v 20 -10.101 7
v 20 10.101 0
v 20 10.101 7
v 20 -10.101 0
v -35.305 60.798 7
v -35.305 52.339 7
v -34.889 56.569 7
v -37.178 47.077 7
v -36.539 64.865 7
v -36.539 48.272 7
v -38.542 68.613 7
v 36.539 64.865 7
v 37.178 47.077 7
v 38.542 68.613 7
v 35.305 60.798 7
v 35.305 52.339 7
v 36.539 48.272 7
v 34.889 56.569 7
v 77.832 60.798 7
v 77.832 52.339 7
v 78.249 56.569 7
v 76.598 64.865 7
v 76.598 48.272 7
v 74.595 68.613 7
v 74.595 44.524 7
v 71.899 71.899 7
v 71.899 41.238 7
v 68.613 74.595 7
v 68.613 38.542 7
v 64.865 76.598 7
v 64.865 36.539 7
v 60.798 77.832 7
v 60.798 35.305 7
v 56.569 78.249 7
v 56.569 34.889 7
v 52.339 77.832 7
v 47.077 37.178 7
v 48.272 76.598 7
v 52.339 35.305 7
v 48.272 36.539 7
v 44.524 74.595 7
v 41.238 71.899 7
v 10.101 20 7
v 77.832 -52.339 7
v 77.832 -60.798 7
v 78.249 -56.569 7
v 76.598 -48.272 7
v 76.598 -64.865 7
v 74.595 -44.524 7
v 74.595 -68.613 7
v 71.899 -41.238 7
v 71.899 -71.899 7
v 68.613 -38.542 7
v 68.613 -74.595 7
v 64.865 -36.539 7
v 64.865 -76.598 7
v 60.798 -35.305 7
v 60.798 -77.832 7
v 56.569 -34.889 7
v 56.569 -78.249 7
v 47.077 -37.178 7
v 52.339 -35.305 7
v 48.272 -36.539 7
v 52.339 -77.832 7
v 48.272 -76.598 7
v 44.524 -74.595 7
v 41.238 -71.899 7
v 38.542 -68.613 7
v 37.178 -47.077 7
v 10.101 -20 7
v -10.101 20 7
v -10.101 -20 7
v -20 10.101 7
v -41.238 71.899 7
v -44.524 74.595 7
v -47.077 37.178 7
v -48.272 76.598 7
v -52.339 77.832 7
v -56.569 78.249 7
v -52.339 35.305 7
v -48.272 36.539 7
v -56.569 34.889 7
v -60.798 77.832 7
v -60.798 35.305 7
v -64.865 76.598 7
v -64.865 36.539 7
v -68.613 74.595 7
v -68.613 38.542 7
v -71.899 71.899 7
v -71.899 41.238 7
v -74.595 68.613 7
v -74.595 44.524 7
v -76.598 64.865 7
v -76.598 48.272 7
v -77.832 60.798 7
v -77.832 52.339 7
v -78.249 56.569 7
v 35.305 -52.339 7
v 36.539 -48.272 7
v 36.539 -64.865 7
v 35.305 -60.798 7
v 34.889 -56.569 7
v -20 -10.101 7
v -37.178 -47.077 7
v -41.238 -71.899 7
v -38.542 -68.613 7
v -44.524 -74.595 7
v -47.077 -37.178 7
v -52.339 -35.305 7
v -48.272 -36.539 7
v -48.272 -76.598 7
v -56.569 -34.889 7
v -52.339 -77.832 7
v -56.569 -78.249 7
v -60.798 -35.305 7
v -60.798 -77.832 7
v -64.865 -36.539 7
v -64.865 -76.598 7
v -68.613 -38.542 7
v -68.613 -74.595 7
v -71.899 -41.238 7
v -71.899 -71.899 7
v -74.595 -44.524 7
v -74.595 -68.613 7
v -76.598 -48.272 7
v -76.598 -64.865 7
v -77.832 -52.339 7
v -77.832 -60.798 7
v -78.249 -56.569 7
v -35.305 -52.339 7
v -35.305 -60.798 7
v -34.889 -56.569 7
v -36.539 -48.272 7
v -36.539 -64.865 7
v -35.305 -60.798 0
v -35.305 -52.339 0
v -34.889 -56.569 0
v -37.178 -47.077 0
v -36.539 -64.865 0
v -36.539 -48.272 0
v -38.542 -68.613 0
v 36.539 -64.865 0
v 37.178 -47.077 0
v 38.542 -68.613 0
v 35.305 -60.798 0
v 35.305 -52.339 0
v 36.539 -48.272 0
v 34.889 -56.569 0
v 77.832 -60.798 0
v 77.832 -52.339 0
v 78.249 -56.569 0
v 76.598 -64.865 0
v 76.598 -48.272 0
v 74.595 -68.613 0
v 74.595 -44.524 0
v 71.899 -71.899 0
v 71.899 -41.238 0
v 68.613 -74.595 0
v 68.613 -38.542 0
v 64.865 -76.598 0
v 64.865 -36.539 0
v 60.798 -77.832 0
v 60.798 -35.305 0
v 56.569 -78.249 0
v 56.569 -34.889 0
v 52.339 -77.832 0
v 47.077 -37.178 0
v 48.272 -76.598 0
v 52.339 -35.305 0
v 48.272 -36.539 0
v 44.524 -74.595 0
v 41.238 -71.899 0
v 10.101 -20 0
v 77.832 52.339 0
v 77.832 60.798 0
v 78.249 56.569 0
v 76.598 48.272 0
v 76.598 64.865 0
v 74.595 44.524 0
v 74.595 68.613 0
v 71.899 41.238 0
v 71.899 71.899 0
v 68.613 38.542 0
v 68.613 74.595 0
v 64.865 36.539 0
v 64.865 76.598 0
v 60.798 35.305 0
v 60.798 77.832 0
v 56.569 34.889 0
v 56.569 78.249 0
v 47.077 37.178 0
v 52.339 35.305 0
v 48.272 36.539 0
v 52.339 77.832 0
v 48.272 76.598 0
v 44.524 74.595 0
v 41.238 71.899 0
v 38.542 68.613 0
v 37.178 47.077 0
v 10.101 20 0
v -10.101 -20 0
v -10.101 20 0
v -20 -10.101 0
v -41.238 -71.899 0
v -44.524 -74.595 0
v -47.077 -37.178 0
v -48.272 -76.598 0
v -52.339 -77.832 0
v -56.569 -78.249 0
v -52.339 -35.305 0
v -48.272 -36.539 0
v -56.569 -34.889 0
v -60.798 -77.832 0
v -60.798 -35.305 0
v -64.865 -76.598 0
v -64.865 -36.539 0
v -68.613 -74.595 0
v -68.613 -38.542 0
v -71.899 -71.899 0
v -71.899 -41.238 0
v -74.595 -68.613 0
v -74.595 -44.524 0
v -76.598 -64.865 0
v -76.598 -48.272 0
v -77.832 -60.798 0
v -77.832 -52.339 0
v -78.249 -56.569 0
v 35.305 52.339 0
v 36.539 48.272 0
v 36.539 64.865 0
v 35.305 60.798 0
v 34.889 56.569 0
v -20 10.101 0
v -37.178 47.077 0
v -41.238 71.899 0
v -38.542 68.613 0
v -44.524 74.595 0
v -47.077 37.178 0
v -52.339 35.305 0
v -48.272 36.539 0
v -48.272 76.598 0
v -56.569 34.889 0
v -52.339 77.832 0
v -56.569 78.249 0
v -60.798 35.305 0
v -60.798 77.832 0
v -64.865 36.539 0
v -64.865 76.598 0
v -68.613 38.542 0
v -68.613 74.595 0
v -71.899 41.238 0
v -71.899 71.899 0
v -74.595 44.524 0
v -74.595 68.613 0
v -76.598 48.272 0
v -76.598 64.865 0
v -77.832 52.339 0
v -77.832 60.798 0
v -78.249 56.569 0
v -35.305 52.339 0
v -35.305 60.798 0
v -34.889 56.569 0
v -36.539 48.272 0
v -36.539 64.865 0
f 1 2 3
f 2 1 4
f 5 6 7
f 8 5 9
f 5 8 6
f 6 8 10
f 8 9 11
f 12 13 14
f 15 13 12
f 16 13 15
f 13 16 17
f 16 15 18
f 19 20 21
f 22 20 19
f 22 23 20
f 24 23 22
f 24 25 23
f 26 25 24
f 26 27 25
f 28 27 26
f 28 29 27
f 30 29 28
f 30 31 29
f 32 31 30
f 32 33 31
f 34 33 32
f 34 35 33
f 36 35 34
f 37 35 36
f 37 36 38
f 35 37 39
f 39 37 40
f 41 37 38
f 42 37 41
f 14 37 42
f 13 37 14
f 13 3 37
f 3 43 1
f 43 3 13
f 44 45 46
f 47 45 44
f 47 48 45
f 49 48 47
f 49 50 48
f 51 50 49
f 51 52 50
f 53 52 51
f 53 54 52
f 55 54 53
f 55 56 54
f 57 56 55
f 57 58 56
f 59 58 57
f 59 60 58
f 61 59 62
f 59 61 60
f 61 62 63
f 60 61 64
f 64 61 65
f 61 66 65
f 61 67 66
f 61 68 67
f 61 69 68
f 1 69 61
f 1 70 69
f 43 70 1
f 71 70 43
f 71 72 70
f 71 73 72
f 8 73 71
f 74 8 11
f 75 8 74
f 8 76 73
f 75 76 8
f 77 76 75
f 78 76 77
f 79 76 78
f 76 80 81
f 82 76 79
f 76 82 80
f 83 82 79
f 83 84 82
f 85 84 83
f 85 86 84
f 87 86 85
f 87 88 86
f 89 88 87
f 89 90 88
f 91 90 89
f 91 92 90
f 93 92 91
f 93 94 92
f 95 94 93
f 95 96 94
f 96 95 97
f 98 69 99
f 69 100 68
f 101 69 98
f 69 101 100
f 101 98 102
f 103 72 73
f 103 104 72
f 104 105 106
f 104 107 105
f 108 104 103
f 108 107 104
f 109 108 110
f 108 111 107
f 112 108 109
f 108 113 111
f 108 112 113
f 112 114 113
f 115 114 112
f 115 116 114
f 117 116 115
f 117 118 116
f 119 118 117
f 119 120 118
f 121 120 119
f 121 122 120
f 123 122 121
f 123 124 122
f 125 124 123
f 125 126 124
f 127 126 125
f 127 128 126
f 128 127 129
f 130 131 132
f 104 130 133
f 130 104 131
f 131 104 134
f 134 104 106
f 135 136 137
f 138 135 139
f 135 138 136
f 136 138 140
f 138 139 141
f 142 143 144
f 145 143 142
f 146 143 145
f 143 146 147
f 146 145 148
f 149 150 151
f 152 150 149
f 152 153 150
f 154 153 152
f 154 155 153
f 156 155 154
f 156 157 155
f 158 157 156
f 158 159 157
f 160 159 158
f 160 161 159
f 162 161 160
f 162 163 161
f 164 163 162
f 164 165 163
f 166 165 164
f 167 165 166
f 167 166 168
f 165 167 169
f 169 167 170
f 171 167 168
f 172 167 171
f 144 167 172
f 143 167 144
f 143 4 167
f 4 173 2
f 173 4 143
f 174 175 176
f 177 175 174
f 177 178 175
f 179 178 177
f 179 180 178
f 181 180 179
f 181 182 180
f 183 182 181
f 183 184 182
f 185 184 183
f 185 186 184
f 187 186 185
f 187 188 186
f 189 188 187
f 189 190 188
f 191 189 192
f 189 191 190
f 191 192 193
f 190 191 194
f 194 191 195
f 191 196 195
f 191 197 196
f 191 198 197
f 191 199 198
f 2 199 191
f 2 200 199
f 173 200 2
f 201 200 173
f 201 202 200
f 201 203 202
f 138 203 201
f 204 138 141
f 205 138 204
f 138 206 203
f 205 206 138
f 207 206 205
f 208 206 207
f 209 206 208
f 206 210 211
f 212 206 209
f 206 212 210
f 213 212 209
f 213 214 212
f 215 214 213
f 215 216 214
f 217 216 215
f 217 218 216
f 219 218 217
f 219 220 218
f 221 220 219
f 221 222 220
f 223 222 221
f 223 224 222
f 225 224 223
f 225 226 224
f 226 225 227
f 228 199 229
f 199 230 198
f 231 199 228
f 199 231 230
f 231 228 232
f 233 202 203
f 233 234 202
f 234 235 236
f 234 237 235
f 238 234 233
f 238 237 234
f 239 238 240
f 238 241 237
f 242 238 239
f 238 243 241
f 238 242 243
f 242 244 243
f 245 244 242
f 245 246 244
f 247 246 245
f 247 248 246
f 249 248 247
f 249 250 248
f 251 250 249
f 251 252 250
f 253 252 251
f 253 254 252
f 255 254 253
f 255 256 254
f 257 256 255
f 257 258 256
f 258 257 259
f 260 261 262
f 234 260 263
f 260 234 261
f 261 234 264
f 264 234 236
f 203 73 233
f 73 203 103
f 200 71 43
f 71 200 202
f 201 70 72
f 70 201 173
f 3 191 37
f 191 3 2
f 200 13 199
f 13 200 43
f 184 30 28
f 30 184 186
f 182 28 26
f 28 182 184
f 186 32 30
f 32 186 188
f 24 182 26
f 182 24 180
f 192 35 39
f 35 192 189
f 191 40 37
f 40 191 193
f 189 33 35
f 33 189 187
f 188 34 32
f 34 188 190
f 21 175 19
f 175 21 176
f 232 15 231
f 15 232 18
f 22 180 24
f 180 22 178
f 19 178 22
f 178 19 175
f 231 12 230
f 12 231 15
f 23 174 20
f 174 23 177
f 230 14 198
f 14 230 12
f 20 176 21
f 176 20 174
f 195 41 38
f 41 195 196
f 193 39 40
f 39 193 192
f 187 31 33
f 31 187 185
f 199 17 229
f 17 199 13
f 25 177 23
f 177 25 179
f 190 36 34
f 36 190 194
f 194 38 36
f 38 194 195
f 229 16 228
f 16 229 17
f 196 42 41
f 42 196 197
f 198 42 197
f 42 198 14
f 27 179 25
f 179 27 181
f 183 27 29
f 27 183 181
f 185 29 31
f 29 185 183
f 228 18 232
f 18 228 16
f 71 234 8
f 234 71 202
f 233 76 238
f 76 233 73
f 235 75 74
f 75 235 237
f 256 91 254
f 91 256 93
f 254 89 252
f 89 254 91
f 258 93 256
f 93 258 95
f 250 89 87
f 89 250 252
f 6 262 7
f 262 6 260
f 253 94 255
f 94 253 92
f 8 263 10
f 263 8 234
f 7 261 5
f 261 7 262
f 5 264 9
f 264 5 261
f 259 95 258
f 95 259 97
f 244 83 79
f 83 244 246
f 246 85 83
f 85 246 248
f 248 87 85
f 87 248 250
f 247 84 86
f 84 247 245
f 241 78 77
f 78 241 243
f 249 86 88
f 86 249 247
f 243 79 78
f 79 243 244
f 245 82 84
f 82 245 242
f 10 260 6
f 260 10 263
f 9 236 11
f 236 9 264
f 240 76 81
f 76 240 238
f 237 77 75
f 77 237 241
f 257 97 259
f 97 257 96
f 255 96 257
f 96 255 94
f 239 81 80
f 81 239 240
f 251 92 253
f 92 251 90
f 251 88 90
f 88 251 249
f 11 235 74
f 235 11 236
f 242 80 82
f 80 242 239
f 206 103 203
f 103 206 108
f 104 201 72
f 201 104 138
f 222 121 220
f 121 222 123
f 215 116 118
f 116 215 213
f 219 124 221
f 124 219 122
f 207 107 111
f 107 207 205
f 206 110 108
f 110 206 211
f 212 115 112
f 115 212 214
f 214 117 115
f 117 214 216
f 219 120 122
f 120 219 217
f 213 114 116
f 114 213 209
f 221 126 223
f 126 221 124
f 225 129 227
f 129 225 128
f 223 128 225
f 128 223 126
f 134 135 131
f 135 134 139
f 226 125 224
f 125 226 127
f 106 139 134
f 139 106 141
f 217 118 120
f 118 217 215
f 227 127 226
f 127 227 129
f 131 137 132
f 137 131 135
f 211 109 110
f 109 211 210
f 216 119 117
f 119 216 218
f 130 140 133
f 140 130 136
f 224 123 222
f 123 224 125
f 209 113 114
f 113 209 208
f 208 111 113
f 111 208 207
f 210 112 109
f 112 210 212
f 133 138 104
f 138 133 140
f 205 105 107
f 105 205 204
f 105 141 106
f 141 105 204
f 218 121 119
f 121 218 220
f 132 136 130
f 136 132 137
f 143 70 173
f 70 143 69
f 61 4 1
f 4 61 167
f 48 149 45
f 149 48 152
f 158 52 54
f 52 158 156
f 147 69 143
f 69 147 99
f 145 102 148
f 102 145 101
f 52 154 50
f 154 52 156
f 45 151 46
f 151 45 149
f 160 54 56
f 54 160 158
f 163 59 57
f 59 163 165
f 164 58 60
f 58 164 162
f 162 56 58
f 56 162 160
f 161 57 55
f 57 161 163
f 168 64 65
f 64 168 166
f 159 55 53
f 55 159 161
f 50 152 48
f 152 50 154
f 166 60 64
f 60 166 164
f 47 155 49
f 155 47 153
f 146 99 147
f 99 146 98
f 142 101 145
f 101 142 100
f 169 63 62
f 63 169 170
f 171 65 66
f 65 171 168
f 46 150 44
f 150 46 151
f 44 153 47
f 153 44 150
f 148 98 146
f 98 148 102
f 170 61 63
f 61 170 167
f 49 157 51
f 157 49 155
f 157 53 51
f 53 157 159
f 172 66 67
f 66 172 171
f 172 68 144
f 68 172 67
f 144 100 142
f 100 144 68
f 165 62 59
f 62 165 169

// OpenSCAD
$fn = 32;

// ----------------------------------------------------------------------
// Quadcopter frame: 203.36 mm across the motor pads, arms 80 mm
// ----------------------------------------------------------------------

// --- parameters (mm) ---
hub = 40;                 // central plate size
plate_t = 7;              // plate thickness
arm_len = 80;             // hub centre to motor pad centre
bar_w = 14;               // arm width
pad_d = 43.36;            // motor pad diameter

module arm_bar() {
  /* flat bar: hull of a stub inside the hub and a box at the pad */
  hull() {
    translate([hub / 4, 0, plate_t / 2]) cube([bar_w, bar_w, plate_t], center = true);
    translate([arm_len, 0, plate_t / 2]) cube([bar_w, bar_w, plate_t], center = true);
  }
}

module pad() {
  translate([arm_len, 0, 0]) cylinder(h = plate_t, d = pad_d);
}

module frame() {
  translate([-hub / 2, -hub / 2, 0]) cube([hub, hub, plate_t]);
  rotate([0, 0, 45]) arm_bar();
  rotate([0, 0, 45]) pad();
  rotate([0, 0, 135]) arm_bar();
  rotate([0, 0, 135]) pad();
  rotate([0, 0, 225]) arm_bar();
  rotate([0, 0, 225]) pad();
  rotate([0, 0, 315]) arm_bar();
  rotate([0, 0, 315]) pad();
}

difference() {
  frame();
}
